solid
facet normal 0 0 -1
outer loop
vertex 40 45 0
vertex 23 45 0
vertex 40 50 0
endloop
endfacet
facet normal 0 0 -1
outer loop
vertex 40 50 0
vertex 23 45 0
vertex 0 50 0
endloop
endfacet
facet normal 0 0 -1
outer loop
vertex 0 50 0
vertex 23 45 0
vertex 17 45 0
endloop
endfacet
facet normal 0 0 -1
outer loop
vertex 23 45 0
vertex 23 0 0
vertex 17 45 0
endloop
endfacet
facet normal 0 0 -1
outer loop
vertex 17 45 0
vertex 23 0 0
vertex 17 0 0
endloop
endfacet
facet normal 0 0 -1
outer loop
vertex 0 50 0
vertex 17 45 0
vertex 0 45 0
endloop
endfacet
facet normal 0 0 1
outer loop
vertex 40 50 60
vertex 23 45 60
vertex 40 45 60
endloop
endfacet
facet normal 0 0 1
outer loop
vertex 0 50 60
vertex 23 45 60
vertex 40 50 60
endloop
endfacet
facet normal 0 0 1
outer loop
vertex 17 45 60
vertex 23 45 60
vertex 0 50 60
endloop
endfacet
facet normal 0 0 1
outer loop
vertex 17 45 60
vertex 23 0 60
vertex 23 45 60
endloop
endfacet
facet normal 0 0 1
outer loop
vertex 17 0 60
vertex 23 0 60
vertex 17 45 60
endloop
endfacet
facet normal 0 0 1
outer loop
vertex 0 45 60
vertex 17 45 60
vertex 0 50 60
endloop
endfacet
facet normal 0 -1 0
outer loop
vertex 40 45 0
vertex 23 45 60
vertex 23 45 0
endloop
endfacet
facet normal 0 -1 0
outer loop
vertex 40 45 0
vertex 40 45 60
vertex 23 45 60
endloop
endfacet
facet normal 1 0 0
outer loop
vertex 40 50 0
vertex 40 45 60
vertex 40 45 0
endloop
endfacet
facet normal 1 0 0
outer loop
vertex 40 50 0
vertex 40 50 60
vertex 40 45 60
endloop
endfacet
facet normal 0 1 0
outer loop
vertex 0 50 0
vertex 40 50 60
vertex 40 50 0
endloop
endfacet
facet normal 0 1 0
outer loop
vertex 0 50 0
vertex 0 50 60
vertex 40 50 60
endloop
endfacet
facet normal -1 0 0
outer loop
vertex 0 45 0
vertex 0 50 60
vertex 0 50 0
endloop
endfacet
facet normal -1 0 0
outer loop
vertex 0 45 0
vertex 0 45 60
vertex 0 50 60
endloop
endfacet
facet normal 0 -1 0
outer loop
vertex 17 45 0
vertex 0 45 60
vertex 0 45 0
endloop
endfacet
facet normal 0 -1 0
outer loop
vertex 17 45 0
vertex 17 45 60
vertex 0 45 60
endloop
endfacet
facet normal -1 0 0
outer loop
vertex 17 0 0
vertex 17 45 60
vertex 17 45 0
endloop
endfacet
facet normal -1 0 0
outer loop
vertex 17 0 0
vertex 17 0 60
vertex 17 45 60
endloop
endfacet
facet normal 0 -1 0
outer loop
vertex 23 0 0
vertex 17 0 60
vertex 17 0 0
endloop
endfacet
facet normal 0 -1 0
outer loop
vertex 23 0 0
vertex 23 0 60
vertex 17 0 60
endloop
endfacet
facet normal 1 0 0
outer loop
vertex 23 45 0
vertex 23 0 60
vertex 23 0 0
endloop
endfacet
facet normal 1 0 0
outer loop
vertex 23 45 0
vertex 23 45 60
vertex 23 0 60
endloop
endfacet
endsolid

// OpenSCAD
$fn = 32;

// ----------------------------------------------------------------------
// Structural section: tee 40 x 50 mm
// ----------------------------------------------------------------------

// --- parameters (mm) ---
sec_w = 40;               // tee width, X
sec_h = 50;               // tee height, Y
flange_t = 5;             // top flange thickness
web_t = 6;                // web thickness
plate_t = 60;             // cut length, Z (extrusion height)
fit_tol = 0.02;           // declared fit tolerance (prompt contract)
free_tol = 0.2;           // declared free tolerance (prompt contract)

profile = [[17, 0], [23, 0], [23, 45], [40, 45], [40, 50], [0, 50], [0, 45], [17, 45]];  // primary outline, 8 points, counter clockwise

// --- the one profile operation ---
linear_extrude(height = plate_t) polygon(points = profile);
